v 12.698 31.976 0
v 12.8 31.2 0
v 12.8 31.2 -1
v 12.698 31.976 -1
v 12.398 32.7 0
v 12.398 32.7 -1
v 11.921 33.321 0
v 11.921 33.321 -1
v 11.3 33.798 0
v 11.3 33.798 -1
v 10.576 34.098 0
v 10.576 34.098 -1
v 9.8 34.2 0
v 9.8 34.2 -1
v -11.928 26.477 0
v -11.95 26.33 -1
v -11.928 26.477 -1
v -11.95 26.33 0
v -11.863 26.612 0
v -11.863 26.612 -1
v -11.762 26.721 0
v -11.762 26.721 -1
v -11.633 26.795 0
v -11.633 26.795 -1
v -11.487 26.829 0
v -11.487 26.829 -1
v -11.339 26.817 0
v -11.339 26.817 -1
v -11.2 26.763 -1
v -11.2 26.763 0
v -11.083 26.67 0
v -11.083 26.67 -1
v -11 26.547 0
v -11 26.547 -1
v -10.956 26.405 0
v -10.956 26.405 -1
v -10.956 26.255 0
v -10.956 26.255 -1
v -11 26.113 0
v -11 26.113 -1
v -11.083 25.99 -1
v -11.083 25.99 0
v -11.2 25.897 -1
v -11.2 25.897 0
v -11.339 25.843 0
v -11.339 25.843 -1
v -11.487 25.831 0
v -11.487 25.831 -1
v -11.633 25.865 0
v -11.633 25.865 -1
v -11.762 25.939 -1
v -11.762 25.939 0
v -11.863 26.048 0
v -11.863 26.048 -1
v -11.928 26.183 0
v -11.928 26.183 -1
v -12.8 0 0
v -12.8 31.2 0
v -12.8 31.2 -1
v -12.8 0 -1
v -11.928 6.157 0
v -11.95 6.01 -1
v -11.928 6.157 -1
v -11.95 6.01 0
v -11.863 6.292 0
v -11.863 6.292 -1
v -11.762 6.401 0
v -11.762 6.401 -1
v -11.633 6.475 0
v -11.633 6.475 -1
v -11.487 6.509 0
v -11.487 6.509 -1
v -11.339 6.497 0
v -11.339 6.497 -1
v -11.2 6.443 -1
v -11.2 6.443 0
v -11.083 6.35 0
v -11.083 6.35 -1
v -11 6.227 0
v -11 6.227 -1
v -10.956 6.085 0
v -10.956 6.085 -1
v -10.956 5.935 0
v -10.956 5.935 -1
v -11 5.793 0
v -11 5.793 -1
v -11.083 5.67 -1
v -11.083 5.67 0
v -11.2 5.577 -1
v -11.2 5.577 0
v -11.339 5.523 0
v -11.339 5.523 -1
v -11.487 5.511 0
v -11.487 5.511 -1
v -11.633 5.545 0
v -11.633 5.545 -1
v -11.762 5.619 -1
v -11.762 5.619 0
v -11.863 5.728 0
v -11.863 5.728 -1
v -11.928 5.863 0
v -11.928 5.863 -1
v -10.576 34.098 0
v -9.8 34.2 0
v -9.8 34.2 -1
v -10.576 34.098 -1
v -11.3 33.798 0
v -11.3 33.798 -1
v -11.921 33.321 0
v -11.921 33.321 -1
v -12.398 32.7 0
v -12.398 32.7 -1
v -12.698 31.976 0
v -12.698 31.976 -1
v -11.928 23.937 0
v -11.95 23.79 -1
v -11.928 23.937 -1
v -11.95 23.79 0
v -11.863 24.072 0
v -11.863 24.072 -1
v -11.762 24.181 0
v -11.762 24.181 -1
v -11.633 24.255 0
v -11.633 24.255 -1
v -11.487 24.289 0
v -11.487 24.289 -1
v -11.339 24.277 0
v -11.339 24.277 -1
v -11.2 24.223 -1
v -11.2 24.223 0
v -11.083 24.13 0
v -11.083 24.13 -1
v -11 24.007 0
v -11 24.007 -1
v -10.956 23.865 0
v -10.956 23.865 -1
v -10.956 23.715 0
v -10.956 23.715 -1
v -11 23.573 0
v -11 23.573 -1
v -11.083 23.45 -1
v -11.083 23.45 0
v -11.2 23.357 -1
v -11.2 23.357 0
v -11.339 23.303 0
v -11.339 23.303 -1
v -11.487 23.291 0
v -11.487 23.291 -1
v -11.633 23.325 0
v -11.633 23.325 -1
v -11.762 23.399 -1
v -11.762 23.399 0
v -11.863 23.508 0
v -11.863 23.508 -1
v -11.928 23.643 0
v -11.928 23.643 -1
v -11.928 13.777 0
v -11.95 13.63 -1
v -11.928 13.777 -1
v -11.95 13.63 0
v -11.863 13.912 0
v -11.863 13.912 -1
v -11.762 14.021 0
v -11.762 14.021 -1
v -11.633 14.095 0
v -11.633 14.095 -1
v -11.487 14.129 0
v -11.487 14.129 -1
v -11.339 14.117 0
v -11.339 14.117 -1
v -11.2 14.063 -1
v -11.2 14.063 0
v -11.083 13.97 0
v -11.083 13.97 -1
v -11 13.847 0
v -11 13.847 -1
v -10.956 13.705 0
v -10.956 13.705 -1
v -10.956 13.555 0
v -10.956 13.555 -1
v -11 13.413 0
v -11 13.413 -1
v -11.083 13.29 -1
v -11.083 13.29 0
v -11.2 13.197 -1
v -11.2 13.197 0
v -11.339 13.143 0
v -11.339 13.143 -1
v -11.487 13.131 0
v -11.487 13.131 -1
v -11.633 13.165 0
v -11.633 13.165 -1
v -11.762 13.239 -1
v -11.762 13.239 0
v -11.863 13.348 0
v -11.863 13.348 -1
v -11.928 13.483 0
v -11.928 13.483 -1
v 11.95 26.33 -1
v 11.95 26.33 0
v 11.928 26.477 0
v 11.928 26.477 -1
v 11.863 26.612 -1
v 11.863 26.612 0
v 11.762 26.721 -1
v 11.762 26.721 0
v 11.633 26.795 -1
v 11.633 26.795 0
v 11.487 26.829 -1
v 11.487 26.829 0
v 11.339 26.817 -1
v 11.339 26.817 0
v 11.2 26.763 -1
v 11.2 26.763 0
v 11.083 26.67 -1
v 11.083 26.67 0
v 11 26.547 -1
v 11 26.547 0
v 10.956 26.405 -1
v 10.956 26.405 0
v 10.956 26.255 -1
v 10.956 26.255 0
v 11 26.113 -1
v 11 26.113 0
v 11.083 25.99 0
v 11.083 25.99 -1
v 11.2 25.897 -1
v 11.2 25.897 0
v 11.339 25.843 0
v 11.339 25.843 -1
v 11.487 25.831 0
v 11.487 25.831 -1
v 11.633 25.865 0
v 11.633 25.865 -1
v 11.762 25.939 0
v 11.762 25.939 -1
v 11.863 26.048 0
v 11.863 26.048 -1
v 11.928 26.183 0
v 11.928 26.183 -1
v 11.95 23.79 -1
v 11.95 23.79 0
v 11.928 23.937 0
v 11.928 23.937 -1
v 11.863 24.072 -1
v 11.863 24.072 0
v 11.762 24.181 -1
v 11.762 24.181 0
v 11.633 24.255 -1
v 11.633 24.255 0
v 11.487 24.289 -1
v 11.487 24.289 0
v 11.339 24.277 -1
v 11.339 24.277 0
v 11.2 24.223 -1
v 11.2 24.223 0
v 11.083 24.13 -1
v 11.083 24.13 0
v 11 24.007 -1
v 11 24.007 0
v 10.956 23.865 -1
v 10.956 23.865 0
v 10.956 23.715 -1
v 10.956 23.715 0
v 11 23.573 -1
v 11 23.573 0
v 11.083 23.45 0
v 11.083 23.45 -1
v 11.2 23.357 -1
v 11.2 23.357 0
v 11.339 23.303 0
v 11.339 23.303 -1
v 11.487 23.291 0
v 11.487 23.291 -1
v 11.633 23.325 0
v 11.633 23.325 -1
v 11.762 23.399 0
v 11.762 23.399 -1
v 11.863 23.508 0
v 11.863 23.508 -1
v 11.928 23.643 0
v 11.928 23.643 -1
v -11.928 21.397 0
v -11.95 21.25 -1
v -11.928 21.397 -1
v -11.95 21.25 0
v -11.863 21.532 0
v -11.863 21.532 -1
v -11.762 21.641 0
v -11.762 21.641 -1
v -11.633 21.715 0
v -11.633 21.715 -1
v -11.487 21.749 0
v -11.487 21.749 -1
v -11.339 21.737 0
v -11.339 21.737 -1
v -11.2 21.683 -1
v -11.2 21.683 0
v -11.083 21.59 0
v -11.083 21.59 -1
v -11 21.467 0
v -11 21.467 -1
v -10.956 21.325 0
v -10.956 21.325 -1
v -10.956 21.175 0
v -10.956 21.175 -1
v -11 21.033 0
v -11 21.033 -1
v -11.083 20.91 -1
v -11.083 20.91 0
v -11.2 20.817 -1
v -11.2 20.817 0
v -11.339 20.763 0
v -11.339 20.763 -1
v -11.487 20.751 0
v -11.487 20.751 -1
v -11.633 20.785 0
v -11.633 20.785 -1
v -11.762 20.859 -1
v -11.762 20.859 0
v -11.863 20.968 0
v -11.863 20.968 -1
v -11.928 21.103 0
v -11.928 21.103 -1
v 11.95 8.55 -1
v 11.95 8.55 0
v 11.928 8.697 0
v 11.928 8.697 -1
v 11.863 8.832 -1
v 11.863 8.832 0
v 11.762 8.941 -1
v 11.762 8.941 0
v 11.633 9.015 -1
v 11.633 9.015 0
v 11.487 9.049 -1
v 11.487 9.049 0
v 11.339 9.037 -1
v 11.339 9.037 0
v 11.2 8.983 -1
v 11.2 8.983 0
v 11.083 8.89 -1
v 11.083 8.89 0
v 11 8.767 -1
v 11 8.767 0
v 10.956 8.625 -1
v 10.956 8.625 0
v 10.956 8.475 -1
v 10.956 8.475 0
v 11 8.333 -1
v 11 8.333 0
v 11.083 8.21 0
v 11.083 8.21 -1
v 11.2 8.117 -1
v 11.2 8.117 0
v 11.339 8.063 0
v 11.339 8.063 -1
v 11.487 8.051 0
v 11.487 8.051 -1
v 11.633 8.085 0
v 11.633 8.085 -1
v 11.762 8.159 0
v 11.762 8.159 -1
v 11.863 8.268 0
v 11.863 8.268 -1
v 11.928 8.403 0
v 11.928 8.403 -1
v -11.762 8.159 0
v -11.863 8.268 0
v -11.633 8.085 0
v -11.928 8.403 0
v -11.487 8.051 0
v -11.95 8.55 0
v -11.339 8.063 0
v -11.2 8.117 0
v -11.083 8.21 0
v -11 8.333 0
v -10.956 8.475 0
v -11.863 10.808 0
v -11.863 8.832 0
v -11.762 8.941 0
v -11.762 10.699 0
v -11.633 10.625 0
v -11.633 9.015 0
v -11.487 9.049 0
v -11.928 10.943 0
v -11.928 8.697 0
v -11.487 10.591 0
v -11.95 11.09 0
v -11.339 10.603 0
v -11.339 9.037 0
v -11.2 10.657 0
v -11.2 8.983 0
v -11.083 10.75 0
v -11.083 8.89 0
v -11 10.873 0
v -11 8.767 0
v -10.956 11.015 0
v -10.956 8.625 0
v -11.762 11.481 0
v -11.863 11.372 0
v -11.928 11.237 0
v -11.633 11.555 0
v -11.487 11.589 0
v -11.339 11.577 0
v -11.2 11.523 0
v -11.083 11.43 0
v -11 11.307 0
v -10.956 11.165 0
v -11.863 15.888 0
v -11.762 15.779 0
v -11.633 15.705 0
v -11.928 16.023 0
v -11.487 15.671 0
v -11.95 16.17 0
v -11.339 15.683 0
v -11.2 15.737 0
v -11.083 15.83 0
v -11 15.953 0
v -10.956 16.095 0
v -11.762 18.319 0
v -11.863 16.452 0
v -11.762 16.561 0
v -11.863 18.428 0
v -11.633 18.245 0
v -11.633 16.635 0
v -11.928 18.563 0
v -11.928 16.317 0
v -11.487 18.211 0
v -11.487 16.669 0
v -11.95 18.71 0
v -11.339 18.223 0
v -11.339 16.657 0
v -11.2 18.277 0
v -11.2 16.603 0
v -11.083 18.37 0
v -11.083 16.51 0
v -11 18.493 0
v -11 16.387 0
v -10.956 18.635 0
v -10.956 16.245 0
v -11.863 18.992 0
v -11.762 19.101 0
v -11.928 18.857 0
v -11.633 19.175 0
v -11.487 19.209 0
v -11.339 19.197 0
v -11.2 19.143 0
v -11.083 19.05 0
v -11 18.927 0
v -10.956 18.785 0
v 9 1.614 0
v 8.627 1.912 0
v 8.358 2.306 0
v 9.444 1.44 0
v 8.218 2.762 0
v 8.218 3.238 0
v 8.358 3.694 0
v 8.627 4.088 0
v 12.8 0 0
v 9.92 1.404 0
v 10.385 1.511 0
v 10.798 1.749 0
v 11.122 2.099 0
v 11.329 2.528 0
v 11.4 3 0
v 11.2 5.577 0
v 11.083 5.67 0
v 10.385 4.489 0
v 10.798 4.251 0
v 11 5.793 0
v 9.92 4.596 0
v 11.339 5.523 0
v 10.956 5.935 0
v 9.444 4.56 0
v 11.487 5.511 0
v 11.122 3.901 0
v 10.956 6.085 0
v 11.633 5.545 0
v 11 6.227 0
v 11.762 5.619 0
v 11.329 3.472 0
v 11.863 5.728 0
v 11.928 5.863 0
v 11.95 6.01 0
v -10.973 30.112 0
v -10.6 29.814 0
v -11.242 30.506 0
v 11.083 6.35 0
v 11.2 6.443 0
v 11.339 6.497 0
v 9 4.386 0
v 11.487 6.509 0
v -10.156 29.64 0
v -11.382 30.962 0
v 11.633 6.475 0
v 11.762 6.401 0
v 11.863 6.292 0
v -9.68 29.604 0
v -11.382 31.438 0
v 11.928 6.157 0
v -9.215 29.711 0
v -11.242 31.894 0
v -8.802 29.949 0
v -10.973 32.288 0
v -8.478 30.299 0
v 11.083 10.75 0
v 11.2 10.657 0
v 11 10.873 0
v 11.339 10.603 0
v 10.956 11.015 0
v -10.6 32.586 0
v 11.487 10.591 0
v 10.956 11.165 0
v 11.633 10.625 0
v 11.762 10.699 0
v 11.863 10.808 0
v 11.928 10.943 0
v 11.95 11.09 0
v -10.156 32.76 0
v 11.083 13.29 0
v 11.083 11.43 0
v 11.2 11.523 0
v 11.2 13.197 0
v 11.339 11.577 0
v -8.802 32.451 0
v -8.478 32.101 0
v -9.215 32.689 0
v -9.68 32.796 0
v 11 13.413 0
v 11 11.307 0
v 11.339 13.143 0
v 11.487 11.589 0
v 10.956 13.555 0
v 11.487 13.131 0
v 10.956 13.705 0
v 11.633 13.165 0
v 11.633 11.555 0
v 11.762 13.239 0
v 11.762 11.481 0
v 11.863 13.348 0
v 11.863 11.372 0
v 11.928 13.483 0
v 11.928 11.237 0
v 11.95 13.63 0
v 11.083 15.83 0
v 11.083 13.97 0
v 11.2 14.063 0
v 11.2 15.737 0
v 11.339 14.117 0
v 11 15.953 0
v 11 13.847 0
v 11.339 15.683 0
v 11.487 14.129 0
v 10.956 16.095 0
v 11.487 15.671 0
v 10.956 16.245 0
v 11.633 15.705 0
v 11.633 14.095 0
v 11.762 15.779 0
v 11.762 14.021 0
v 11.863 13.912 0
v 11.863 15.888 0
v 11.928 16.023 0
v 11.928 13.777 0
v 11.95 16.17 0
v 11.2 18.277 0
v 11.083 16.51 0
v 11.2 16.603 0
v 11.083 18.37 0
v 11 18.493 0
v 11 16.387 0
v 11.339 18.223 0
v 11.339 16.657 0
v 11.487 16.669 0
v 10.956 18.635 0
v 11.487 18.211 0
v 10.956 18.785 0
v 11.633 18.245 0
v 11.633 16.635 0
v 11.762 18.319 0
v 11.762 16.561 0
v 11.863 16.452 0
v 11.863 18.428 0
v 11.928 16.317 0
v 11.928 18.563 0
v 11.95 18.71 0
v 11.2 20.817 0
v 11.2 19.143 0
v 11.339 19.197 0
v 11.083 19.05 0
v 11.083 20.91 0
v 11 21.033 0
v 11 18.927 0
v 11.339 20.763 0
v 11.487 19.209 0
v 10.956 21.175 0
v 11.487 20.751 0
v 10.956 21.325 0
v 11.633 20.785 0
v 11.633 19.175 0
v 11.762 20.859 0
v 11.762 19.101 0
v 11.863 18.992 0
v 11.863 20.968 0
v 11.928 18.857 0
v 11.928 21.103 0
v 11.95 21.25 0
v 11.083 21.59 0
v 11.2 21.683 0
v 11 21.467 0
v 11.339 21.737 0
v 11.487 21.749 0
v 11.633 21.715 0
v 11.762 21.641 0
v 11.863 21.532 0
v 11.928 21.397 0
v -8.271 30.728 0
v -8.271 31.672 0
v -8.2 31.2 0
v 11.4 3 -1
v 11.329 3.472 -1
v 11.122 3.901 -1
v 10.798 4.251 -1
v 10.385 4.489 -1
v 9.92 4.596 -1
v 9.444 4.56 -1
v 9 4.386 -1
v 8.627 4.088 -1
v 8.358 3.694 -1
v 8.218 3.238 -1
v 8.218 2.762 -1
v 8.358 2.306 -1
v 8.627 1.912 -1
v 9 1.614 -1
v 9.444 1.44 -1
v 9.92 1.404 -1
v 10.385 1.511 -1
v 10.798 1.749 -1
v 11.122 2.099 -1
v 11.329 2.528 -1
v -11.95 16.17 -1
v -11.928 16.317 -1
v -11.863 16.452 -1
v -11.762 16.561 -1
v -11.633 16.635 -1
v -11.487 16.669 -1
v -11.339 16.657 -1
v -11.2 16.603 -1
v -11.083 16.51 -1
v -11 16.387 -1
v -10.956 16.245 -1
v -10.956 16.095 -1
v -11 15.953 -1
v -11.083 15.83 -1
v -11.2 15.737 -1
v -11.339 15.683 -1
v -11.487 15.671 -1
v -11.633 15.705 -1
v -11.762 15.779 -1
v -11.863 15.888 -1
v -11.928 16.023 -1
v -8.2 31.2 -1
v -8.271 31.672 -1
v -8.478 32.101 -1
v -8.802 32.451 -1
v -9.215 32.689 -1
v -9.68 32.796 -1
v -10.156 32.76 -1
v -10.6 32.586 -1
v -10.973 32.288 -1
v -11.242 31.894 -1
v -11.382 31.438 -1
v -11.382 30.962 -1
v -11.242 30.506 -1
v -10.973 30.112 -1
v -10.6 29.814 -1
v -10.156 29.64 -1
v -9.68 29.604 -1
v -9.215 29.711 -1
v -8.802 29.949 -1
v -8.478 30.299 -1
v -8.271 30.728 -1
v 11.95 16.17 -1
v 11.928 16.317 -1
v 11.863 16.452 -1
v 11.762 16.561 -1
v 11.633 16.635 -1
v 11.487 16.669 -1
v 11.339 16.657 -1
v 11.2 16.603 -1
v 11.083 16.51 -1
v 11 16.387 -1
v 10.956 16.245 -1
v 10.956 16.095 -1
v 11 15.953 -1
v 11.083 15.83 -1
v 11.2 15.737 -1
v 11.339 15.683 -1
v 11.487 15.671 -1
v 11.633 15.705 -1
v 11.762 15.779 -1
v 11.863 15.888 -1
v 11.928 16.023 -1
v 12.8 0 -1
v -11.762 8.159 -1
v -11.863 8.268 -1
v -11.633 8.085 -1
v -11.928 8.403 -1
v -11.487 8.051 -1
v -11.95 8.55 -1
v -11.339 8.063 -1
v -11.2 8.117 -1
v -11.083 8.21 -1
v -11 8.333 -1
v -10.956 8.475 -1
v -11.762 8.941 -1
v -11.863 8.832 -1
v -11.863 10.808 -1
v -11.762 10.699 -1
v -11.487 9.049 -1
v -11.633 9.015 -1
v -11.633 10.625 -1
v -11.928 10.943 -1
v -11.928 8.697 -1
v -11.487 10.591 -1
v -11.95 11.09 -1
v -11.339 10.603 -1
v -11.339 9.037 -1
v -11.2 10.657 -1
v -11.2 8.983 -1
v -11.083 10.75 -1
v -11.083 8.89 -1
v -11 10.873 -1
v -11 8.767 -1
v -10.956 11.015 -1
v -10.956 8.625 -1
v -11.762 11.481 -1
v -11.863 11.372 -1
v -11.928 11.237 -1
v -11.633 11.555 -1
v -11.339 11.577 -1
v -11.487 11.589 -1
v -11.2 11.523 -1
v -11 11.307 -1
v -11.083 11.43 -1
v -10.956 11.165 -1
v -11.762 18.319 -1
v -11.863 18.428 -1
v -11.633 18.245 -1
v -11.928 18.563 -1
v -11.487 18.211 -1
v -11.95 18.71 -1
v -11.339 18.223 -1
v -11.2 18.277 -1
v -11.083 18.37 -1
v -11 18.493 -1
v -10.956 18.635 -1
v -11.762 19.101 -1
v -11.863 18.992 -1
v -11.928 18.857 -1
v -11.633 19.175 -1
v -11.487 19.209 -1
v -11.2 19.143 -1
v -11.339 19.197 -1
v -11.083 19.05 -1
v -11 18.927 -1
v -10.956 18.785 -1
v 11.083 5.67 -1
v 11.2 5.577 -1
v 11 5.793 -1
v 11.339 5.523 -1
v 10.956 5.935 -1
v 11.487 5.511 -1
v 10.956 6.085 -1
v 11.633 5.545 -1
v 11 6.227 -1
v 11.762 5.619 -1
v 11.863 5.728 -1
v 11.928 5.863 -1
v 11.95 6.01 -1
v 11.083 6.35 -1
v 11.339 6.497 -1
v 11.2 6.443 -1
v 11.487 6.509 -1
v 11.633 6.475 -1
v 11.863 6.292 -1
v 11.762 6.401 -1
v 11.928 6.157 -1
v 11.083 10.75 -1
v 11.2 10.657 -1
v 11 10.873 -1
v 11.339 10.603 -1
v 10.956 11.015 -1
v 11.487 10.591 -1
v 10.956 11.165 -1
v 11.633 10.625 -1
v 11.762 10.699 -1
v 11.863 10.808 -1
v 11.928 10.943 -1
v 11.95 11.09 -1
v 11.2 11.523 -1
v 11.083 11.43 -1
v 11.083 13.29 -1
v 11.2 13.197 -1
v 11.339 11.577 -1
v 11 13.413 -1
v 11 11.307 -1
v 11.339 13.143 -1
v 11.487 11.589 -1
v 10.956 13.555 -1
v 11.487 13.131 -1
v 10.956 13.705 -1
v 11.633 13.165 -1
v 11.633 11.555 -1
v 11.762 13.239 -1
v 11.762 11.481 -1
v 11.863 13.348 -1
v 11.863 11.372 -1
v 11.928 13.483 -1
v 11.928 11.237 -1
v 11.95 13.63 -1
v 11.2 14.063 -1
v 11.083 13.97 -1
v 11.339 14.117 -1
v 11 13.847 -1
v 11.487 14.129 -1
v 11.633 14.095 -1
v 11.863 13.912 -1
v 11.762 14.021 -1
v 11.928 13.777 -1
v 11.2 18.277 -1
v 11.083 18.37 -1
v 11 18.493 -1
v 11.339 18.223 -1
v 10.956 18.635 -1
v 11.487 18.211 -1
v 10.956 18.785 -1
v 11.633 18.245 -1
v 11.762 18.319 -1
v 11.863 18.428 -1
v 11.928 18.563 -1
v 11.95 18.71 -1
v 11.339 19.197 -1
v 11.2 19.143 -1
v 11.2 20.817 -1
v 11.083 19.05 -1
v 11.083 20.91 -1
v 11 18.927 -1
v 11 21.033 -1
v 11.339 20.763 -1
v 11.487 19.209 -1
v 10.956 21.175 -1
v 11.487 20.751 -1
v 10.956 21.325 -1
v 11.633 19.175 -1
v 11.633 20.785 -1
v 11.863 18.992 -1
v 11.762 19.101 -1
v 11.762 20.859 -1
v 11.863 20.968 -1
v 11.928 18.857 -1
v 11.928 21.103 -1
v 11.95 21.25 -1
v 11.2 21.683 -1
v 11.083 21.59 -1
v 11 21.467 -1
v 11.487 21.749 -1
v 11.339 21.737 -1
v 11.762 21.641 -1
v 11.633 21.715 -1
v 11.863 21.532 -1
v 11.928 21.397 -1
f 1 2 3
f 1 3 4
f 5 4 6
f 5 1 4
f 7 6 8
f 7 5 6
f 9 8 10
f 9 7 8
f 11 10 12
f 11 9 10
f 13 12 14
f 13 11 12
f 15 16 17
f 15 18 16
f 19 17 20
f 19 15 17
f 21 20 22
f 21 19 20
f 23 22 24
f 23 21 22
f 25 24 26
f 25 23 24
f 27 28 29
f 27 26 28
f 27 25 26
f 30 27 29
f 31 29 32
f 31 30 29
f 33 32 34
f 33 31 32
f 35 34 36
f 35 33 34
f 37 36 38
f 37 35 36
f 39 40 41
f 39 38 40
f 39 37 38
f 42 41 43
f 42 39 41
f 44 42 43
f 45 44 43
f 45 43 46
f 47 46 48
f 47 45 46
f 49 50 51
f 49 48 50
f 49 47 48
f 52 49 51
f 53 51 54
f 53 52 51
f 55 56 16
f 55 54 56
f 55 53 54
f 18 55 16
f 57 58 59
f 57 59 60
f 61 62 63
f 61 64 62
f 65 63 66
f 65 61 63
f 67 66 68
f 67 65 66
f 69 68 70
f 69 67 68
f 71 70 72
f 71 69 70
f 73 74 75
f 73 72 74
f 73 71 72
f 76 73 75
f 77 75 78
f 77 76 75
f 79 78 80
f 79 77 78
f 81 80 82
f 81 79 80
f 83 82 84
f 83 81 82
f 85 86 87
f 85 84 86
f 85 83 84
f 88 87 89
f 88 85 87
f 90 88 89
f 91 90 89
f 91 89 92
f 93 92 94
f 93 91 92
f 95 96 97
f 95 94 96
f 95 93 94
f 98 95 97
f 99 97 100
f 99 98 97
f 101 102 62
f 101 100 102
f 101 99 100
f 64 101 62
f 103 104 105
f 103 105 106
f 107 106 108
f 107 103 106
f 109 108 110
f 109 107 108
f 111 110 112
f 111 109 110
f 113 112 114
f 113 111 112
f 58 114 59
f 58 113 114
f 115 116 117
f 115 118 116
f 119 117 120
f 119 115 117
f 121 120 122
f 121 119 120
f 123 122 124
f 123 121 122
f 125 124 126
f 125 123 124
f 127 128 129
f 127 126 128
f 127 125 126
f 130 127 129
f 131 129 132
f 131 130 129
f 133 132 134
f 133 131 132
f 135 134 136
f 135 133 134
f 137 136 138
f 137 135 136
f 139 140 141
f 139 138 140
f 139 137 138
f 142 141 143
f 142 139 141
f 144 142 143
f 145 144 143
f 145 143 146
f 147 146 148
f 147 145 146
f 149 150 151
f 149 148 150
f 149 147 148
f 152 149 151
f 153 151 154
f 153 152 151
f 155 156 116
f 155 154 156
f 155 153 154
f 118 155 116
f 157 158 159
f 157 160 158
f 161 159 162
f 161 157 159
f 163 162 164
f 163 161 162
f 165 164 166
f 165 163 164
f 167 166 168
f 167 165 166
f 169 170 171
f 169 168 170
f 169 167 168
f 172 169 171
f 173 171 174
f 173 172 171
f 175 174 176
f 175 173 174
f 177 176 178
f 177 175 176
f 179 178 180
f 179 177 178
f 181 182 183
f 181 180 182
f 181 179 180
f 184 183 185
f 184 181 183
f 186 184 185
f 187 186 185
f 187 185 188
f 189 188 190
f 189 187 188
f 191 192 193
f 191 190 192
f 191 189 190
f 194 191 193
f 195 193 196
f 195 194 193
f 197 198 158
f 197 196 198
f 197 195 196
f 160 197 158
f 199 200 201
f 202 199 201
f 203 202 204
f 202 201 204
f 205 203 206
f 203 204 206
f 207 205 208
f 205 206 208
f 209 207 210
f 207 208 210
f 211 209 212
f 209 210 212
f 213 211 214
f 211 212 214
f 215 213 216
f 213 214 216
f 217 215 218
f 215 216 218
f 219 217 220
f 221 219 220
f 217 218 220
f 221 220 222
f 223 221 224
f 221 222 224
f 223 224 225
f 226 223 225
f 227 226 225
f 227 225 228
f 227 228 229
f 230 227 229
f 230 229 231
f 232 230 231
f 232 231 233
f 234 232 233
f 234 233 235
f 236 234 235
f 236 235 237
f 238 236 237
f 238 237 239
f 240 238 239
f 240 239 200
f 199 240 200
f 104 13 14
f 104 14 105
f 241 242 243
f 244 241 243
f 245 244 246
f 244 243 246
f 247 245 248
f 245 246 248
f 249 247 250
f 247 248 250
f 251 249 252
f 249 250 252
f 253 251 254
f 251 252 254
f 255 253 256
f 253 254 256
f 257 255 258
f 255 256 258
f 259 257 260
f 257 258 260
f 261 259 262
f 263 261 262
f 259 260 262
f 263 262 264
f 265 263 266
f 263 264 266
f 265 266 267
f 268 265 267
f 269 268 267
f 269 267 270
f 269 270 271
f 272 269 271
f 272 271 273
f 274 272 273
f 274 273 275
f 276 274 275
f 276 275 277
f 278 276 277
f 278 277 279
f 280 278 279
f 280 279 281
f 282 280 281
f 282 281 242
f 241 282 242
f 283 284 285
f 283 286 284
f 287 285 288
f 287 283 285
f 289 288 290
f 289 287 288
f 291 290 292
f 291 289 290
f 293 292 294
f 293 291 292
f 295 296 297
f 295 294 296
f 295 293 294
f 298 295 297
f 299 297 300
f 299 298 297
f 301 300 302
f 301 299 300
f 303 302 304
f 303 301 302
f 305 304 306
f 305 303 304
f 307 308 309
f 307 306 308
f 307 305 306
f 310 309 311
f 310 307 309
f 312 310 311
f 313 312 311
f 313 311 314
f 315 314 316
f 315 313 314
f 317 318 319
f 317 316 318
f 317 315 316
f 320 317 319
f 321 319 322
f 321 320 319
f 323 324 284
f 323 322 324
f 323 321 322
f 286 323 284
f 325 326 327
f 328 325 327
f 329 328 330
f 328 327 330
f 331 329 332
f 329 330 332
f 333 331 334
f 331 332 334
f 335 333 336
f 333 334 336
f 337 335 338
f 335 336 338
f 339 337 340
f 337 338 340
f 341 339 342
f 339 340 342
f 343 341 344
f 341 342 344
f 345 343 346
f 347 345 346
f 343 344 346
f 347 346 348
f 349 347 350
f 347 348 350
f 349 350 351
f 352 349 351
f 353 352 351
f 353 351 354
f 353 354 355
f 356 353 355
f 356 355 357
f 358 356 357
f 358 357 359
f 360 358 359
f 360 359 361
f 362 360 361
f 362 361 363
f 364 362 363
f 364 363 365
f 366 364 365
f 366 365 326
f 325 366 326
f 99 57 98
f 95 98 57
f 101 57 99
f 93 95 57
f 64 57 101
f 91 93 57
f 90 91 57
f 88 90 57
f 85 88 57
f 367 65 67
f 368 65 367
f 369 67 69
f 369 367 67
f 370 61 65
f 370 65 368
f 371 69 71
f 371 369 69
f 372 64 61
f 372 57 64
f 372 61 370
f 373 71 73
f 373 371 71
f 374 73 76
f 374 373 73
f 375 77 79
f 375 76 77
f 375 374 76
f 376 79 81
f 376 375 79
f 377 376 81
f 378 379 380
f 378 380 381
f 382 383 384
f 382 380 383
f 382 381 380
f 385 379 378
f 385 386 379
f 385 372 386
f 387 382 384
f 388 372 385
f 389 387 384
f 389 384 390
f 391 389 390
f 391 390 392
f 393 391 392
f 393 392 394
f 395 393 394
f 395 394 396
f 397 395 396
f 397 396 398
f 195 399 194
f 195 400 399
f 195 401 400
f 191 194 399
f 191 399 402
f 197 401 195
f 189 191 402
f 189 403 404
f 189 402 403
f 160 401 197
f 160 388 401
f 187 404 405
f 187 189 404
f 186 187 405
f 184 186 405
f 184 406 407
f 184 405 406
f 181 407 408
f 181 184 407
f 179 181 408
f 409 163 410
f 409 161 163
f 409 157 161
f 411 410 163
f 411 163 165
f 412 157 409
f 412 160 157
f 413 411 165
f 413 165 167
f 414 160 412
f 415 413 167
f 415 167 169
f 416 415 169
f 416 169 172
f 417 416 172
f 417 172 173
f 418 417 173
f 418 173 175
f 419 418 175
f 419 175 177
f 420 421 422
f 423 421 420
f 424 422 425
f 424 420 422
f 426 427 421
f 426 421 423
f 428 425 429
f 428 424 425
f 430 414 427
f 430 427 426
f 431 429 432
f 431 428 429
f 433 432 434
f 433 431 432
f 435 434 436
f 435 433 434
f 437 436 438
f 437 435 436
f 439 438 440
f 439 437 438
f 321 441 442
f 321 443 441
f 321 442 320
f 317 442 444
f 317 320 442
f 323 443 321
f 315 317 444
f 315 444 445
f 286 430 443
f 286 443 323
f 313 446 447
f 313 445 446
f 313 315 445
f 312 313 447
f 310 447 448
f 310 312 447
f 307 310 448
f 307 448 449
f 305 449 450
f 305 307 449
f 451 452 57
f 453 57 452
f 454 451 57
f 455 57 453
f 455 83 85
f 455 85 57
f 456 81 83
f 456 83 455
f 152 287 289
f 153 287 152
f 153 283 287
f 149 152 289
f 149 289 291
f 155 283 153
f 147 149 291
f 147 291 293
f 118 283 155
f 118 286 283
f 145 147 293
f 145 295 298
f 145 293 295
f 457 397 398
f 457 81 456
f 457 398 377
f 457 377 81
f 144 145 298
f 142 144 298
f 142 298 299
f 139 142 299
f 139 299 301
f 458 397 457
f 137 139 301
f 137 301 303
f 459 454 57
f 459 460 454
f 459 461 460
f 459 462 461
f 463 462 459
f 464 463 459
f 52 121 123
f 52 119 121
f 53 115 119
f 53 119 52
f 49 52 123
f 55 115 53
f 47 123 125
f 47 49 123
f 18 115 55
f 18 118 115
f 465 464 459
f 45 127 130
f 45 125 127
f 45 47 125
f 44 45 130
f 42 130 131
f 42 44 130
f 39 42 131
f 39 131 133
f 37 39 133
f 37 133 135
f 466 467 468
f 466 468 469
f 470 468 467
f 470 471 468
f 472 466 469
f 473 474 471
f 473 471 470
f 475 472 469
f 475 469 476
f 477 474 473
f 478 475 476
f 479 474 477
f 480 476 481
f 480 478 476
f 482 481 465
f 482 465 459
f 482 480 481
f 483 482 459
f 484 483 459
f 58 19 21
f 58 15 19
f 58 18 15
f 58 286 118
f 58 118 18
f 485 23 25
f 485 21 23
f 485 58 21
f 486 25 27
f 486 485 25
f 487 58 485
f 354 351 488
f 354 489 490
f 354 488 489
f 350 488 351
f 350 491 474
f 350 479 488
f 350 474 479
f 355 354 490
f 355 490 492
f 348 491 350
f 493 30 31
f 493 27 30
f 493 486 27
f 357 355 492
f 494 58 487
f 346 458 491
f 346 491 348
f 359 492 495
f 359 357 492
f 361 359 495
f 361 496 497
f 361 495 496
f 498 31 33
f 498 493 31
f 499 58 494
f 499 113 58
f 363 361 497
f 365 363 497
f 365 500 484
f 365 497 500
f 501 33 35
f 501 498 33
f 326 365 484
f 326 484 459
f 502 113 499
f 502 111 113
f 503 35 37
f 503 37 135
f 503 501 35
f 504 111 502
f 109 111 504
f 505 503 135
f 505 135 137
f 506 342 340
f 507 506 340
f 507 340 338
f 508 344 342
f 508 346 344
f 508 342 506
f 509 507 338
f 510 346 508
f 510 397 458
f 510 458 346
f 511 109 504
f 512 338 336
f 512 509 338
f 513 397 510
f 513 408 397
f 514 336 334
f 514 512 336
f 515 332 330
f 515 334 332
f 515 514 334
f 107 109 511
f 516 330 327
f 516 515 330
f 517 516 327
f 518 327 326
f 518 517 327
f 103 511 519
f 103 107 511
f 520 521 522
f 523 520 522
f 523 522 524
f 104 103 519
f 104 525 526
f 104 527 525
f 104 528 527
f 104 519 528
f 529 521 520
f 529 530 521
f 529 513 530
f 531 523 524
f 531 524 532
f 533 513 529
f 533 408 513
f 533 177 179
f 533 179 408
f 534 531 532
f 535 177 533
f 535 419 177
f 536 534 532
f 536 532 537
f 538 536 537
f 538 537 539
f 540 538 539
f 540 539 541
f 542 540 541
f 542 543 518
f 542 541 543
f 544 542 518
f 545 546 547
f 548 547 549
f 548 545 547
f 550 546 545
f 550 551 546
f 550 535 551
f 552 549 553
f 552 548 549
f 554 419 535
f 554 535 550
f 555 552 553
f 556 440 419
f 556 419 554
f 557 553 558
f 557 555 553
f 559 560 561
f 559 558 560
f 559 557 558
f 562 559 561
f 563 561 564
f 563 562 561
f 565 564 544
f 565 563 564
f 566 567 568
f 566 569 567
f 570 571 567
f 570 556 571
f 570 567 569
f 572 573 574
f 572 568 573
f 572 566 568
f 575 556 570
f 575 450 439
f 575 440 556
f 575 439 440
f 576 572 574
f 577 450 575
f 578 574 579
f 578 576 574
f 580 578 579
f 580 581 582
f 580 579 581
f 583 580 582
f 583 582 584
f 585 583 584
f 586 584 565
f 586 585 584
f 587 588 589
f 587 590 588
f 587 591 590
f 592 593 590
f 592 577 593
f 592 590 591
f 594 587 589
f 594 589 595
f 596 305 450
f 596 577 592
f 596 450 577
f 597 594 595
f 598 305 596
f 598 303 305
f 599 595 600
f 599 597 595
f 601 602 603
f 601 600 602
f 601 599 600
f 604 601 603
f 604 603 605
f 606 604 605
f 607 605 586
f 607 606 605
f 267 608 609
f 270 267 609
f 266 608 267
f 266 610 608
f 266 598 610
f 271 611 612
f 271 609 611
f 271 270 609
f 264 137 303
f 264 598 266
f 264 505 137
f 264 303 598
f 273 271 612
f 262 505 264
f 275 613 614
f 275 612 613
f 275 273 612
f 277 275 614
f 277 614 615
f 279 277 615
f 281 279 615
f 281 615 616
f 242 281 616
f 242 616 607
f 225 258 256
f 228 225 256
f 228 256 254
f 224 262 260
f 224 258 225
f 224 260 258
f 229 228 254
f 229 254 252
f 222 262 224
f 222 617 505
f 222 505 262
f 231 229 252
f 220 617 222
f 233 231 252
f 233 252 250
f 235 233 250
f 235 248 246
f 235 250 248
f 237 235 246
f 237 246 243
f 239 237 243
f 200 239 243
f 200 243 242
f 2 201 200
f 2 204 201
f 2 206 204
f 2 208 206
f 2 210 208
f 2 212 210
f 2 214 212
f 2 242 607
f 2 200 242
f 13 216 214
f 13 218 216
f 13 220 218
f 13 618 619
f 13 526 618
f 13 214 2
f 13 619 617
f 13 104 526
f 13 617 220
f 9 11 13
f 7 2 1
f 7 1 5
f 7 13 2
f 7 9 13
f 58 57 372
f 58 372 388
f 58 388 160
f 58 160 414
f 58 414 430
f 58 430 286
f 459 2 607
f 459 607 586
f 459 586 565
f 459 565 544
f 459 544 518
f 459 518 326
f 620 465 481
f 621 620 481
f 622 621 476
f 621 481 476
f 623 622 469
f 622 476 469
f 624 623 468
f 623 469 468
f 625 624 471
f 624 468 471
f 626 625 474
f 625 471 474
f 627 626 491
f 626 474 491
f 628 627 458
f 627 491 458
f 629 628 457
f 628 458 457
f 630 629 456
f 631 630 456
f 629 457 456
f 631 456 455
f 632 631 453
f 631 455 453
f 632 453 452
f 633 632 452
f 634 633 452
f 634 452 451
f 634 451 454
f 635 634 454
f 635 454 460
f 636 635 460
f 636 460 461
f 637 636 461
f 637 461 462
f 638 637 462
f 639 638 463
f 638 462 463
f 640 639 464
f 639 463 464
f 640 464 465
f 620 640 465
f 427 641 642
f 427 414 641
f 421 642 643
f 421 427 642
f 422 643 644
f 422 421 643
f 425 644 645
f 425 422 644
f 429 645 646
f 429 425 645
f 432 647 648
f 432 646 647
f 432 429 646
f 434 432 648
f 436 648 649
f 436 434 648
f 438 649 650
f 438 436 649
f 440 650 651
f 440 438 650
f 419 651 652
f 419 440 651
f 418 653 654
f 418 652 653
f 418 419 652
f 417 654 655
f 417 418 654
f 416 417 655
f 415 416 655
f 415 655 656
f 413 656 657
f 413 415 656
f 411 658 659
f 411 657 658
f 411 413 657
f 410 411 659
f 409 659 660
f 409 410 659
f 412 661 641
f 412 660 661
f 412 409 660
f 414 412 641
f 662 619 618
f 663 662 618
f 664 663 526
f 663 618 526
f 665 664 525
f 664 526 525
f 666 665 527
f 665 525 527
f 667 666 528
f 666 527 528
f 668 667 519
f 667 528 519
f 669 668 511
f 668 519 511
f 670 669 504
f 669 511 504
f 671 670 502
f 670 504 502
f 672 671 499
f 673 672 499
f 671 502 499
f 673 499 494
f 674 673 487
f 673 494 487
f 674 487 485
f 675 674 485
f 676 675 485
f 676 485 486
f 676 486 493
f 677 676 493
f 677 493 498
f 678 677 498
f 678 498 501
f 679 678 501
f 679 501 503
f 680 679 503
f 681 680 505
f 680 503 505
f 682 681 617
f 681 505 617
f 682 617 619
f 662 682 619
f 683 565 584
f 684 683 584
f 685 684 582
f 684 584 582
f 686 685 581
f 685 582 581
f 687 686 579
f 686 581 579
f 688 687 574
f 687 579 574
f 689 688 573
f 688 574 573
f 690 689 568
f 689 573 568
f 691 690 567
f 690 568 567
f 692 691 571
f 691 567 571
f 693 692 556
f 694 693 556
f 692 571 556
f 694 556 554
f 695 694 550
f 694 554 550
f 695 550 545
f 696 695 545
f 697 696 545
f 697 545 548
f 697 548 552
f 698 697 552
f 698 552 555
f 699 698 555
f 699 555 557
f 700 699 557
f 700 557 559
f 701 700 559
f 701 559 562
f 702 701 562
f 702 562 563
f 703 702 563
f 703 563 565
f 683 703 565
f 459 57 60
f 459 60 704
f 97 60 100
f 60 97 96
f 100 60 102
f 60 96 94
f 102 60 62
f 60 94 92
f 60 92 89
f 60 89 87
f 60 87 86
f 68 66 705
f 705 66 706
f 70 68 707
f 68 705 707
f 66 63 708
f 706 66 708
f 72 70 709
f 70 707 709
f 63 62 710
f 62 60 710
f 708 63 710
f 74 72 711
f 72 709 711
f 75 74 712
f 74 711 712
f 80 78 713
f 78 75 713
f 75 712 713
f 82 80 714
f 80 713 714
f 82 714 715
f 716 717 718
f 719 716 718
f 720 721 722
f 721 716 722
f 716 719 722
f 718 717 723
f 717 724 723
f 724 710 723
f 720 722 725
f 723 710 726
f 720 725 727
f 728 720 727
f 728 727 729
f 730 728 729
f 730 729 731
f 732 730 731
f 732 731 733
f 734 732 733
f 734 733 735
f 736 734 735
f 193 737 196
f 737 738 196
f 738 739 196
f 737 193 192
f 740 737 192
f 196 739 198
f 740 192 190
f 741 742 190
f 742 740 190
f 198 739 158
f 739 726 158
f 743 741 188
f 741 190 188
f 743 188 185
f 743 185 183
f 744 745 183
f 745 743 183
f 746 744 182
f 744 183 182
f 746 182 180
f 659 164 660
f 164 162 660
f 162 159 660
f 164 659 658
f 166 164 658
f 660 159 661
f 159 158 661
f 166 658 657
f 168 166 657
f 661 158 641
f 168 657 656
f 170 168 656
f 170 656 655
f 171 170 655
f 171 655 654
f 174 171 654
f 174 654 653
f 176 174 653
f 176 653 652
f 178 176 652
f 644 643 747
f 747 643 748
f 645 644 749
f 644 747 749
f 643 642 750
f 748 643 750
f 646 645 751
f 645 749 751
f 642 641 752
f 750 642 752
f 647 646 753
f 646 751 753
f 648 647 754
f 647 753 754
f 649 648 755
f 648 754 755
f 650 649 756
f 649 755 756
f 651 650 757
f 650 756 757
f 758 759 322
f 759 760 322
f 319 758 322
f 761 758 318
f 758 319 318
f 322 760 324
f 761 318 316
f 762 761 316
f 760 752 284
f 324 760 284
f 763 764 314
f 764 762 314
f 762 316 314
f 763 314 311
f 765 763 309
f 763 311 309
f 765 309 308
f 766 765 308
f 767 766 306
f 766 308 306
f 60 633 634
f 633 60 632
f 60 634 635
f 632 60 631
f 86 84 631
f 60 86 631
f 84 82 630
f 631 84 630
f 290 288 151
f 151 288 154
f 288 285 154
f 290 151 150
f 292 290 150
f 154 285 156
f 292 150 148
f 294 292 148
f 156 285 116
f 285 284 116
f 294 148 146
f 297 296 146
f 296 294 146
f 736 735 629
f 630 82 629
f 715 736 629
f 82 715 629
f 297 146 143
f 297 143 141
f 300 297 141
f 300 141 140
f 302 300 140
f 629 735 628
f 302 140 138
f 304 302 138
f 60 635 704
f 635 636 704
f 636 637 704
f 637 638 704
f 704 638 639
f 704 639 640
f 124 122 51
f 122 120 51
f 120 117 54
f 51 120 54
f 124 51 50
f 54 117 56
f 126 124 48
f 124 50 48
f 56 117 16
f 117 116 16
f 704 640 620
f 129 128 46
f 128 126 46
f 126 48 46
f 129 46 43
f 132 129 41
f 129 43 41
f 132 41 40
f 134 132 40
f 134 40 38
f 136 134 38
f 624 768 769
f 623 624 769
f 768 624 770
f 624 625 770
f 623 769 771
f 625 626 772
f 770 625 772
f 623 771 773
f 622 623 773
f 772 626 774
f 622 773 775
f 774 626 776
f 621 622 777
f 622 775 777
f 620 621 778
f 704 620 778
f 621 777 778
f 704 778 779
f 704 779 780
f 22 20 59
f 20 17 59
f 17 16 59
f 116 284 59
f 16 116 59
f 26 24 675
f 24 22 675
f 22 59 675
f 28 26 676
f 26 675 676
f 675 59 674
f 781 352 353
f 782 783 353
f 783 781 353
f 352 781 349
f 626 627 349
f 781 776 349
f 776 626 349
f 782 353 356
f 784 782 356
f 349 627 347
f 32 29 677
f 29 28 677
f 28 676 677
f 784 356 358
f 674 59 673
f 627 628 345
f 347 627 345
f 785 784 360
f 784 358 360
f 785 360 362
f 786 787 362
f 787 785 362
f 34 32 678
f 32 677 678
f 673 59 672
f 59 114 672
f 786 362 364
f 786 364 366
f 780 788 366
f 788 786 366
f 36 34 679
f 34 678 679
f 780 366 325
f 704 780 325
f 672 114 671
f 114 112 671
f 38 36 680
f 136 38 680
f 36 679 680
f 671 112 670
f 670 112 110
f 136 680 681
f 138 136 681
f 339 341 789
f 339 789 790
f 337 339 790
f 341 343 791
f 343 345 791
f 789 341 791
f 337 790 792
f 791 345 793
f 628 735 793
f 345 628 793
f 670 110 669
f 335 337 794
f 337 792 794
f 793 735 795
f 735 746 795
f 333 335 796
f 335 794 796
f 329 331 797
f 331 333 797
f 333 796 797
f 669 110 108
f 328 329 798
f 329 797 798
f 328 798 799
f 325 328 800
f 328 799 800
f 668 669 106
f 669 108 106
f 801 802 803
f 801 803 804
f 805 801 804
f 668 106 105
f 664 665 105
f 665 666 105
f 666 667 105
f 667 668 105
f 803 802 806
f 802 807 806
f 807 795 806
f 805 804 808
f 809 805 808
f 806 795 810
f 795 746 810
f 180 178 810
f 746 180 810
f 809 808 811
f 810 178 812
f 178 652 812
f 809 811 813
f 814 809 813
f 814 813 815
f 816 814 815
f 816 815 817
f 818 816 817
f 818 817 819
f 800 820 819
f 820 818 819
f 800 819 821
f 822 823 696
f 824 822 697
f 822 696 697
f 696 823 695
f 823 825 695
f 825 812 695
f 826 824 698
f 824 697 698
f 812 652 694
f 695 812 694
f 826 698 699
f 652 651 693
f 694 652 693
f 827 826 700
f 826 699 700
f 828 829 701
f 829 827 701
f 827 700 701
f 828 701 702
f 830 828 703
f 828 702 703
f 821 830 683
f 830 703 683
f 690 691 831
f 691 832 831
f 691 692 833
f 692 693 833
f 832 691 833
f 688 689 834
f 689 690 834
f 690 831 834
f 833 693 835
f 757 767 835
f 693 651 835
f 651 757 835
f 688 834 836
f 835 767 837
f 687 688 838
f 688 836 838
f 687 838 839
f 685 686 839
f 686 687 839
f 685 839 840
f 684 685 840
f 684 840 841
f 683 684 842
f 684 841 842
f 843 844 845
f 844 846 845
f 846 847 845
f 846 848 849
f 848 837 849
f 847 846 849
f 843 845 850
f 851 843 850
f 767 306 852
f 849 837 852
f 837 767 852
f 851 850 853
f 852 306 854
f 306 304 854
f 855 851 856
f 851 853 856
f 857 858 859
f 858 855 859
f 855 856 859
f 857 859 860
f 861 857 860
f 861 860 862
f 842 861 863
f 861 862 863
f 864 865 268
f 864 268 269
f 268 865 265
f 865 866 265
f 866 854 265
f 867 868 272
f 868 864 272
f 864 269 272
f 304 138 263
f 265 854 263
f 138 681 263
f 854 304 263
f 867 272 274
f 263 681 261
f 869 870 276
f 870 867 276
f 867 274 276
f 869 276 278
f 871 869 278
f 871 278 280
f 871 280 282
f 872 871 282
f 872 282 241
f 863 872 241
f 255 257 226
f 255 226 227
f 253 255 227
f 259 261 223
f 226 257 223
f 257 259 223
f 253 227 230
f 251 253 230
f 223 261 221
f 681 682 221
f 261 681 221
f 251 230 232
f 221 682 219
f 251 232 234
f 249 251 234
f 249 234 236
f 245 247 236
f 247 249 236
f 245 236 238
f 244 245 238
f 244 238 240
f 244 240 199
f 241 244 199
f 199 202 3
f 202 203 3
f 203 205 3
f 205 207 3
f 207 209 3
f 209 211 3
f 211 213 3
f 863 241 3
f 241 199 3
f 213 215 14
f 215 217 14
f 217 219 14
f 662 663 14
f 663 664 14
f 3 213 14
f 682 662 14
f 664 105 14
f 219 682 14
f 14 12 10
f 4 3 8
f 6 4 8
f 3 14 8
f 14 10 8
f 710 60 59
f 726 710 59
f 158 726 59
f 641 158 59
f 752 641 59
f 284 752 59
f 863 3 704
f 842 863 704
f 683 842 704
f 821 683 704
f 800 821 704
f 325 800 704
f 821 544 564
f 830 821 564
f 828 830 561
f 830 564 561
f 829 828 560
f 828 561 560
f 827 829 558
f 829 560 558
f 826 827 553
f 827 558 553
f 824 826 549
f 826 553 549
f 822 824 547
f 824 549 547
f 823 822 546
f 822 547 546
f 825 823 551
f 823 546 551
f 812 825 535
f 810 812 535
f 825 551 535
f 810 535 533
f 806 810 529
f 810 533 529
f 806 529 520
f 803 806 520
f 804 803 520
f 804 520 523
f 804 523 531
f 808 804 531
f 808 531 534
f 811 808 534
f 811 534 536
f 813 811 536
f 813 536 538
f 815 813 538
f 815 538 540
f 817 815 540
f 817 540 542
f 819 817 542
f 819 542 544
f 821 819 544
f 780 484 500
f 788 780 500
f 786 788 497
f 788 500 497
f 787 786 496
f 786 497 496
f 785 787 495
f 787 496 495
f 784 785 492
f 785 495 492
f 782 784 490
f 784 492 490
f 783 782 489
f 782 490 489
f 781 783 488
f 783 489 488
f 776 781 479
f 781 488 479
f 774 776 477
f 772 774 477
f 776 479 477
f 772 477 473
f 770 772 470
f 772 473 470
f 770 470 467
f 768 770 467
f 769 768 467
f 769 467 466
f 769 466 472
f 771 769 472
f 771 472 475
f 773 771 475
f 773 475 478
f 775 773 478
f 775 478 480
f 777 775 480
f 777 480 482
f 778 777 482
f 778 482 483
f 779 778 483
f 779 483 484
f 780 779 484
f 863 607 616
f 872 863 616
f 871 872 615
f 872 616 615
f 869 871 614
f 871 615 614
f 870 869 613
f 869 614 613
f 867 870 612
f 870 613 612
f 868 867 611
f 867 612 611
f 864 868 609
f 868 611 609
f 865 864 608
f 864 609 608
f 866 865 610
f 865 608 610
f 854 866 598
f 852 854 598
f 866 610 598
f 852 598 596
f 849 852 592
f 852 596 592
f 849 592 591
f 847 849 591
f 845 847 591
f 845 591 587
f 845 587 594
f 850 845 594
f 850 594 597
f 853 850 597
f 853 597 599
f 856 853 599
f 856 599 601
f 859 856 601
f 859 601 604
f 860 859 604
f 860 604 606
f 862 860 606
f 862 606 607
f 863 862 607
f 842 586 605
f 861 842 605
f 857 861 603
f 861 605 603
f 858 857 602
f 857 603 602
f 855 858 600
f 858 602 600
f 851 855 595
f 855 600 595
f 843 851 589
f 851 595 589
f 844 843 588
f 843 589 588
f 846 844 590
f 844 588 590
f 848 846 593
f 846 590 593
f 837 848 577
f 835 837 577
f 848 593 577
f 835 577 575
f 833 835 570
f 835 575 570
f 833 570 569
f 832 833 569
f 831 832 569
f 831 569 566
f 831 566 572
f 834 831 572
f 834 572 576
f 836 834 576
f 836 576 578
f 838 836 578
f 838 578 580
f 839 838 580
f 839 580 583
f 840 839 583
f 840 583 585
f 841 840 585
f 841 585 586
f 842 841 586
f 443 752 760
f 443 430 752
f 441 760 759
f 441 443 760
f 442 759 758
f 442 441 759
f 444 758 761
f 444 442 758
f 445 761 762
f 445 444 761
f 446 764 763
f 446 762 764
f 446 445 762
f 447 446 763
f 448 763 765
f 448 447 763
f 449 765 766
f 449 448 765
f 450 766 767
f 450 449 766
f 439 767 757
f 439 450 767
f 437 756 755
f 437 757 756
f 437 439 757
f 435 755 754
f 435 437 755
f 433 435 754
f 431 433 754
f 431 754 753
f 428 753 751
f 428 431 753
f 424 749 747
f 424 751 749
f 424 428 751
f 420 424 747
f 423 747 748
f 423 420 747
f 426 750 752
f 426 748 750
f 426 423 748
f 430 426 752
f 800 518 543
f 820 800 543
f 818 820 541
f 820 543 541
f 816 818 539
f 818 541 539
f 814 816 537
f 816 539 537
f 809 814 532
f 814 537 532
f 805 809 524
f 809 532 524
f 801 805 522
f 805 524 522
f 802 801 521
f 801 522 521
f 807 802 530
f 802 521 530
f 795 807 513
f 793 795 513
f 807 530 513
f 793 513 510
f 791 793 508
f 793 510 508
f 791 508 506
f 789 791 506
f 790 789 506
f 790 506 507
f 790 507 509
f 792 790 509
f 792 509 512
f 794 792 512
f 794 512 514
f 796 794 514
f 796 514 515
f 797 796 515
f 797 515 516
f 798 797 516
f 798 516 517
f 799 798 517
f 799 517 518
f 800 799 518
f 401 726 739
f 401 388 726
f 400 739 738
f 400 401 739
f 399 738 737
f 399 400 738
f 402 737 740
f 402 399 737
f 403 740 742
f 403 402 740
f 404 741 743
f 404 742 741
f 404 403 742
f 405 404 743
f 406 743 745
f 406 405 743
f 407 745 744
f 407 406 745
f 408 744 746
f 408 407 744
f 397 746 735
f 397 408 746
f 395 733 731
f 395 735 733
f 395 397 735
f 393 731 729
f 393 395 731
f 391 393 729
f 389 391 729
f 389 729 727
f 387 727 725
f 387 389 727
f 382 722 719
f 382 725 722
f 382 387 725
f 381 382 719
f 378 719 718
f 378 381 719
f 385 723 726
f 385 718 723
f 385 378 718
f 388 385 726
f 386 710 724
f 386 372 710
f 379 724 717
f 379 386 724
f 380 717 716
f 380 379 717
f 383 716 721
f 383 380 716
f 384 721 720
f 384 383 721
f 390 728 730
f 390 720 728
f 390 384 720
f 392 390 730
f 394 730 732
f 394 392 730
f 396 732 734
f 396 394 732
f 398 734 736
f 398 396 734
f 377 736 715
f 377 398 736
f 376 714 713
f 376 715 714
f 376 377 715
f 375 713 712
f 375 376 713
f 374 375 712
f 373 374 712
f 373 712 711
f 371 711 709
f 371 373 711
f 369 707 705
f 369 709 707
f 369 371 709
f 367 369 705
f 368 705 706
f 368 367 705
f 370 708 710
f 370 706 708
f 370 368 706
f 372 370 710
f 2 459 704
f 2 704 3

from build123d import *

# Parameters (mm, degrees)
SKETCH012_R                             = 1.6
PAD006_DEPTH                            = 1
SKETCH019_R                             = 0.5
POCKET003_DEPTH                         = 86.464442
POCKET003_DEPTH_BACK                    = 85.464442
SKETCH019_LINEARPATTERN001_2_R          = 0.5
POCKET003_LINEARPATTERN001_2_DEPTH      = 86.464442
POCKET003_LINEARPATTERN001_2_DEPTH_BACK = 85.464442
SKETCH019_LINEARPATTERN001_3_R          = 0.5
POCKET003_LINEARPATTERN001_3_DEPTH      = 86.464442
POCKET003_LINEARPATTERN001_3_DEPTH_BACK = 85.464442
SKETCH019_LINEARPATTERN001_4_R          = 0.5
POCKET003_LINEARPATTERN001_4_DEPTH      = 86.464442
POCKET003_LINEARPATTERN001_4_DEPTH_BACK = 85.464442
SKETCH019_LINEARPATTERN001_5_R          = 0.5
POCKET003_LINEARPATTERN001_5_DEPTH      = 86.464442
POCKET003_LINEARPATTERN001_5_DEPTH_BACK = 85.464442
SKETCH019_LINEARPATTERN001_6_R          = 0.5
POCKET003_LINEARPATTERN001_6_DEPTH      = 86.464442
POCKET003_LINEARPATTERN001_6_DEPTH_BACK = 85.464442
SKETCH019_LINEARPATTERN001_7_R          = 0.5
POCKET003_LINEARPATTERN001_7_DEPTH      = 86.464442
POCKET003_LINEARPATTERN001_7_DEPTH_BACK = 85.464442
SKETCH019_LINEARPATTERN001_8_R          = 0.5
POCKET003_LINEARPATTERN001_8_DEPTH      = 86.464442
POCKET003_LINEARPATTERN001_8_DEPTH_BACK = 85.464442
SKETCH019_LINEARPATTERN001_9_R          = 0.5
POCKET003_LINEARPATTERN001_9_DEPTH      = 86.464442
POCKET003_LINEARPATTERN001_9_DEPTH_BACK = 85.464442


with BuildPart() as part:
    # Sketch012 → Pad006 (new body)
    with BuildSketch(Plane.XY):
        with BuildLine():
            Line((9.8, 17.1), (-9.8, 17.1))
            ThreePointArc((-9.8, 17.1), (-11.92132, 16.22132), (-12.8, 14.1))
            Line((-12.8, 14.1), (-12.8, -17.1))
            Line((-12.8, -17.1), (12.8, -17.1))
            Line((12.8, -17.1), (12.8, 14.1))
            ThreePointArc((12.8, 14.1), (11.92132, 16.22132), (9.8, 17.1))
        make_face()
        with Locations((-9.8, 14.1)):
            Circle(SKETCH012_R, mode=Mode.SUBTRACT)
        with Locations((9.8, -14.1)):
            Circle(SKETCH012_R, mode=Mode.SUBTRACT)
    extrude(amount=-PAD006_DEPTH)

    # Sketch019 → Pocket003 (cut, two sides)
    with BuildSketch(Plane.XY) as pocket003_sk:
        with Locations((11.45, -11.09)):
            Circle(SKETCH019_R)
    pocket003 = extrude(amount=-POCKET003_DEPTH, mode=Mode.SUBTRACT) + extrude(pocket003_sk.sketch, amount=POCKET003_DEPTH_BACK, mode=Mode.SUBTRACT)

    # Sketch019 LinearPattern001 2 → Pocket003 LinearPattern001 2 (cut, two sides)
    with BuildSketch(Plane(origin=(0, 2.54, 0), x_dir=(1, 0, 0), z_dir=(0, 0, 1))) as pocket003_linearpattern001_2_sk:
        with Locations((11.45, -11.09)):
            Circle(SKETCH019_LINEARPATTERN001_2_R)
    pocket003_linearpattern001_2 = extrude(amount=-POCKET003_LINEARPATTERN001_2_DEPTH, mode=Mode.SUBTRACT) + extrude(pocket003_linearpattern001_2_sk.sketch, amount=POCKET003_LINEARPATTERN001_2_DEPTH_BACK, mode=Mode.SUBTRACT)

    # Sketch019 LinearPattern001 3 → Pocket003 LinearPattern001 3 (cut, two sides)
    with BuildSketch(Plane(origin=(0, 5.08, 0), x_dir=(1, 0, 0), z_dir=(0, 0, 1))) as pocket003_linearpattern001_3_sk:
        with Locations((11.45, -11.09)):
            Circle(SKETCH019_LINEARPATTERN001_3_R)
    pocket003_linearpattern001_3 = extrude(amount=-POCKET003_LINEARPATTERN001_3_DEPTH, mode=Mode.SUBTRACT) + extrude(pocket003_linearpattern001_3_sk.sketch, amount=POCKET003_LINEARPATTERN001_3_DEPTH_BACK, mode=Mode.SUBTRACT)

    # Sketch019 LinearPattern001 4 → Pocket003 LinearPattern001 4 (cut, two sides)
    with BuildSketch(Plane(origin=(0, 7.62, 0), x_dir=(1, 0, 0), z_dir=(0, 0, 1))) as pocket003_linearpattern001_4_sk:
        with Locations((11.45, -11.09)):
            Circle(SKETCH019_LINEARPATTERN001_4_R)
    pocket003_linearpattern001_4 = extrude(amount=-POCKET003_LINEARPATTERN001_4_DEPTH, mode=Mode.SUBTRACT) + extrude(pocket003_linearpattern001_4_sk.sketch, amount=POCKET003_LINEARPATTERN001_4_DEPTH_BACK, mode=Mode.SUBTRACT)

    # Sketch019 LinearPattern001 5 → Pocket003 LinearPattern001 5 (cut, two sides)
    with BuildSketch(Plane(origin=(0, 10.16, 0), x_dir=(1, 0, 0), z_dir=(0, 0, 1))) as pocket003_linearpattern001_5_sk:
        with Locations((11.45, -11.09)):
            Circle(SKETCH019_LINEARPATTERN001_5_R)
    pocket003_linearpattern001_5 = extrude(amount=-POCKET003_LINEARPATTERN001_5_DEPTH, mode=Mode.SUBTRACT) + extrude(pocket003_linearpattern001_5_sk.sketch, amount=POCKET003_LINEARPATTERN001_5_DEPTH_BACK, mode=Mode.SUBTRACT)

    # Sketch019 LinearPattern001 6 → Pocket003 LinearPattern001 6 (cut, two sides)
    with BuildSketch(Plane(origin=(0, 12.7, 0), x_dir=(1, 0, 0), z_dir=(0, 0, 1))) as pocket003_linearpattern001_6_sk:
        with Locations((11.45, -11.09)):
            Circle(SKETCH019_LINEARPATTERN001_6_R)
    pocket003_linearpattern001_6 = extrude(amount=-POCKET003_LINEARPATTERN001_6_DEPTH, mode=Mode.SUBTRACT) + extrude(pocket003_linearpattern001_6_sk.sketch, amount=POCKET003_LINEARPATTERN001_6_DEPTH_BACK, mode=Mode.SUBTRACT)

    # Sketch019 LinearPattern001 7 → Pocket003 LinearPattern001 7 (cut, two sides)
    with BuildSketch(Plane(origin=(0, 15.24, 0), x_dir=(1, 0, 0), z_dir=(0, 0, 1))) as pocket003_linearpattern001_7_sk:
        with Locations((11.45, -11.09)):
            Circle(SKETCH019_LINEARPATTERN001_7_R)
    pocket003_linearpattern001_7 = extrude(amount=-POCKET003_LINEARPATTERN001_7_DEPTH, mode=Mode.SUBTRACT) + extrude(pocket003_linearpattern001_7_sk.sketch, amount=POCKET003_LINEARPATTERN001_7_DEPTH_BACK, mode=Mode.SUBTRACT)

    # Sketch019 LinearPattern001 8 → Pocket003 LinearPattern001 8 (cut, two sides)
    with BuildSketch(Plane(origin=(0, 17.78, 0), x_dir=(1, 0, 0), z_dir=(0, 0, 1))) as pocket003_linearpattern001_8_sk:
        with Locations((11.45, -11.09)):
            Circle(SKETCH019_LINEARPATTERN001_8_R)
    pocket003_linearpattern001_8 = extrude(amount=-POCKET003_LINEARPATTERN001_8_DEPTH, mode=Mode.SUBTRACT) + extrude(pocket003_linearpattern001_8_sk.sketch, amount=POCKET003_LINEARPATTERN001_8_DEPTH_BACK, mode=Mode.SUBTRACT)

    # Sketch019 LinearPattern001 9 → Pocket003 LinearPattern001 9 (cut, two sides)
    with BuildSketch(Plane(origin=(0, 20.32, 0), x_dir=(1, 0, 0), z_dir=(0, 0, 1))) as pocket003_linearpattern001_9_sk:
        with Locations((11.45, -11.09)):
            Circle(SKETCH019_LINEARPATTERN001_9_R)
    pocket003_linearpattern001_9 = extrude(amount=-POCKET003_LINEARPATTERN001_9_DEPTH, mode=Mode.SUBTRACT) + extrude(pocket003_linearpattern001_9_sk.sketch, amount=POCKET003_LINEARPATTERN001_9_DEPTH_BACK, mode=Mode.SUBTRACT)

    # Mirrored004: Pocket003, Pocket003 LinearPattern001 2, Pocket003 LinearPattern001 3, Pocket003 LinearPattern001 4, Pocket003 LinearPattern001 5, Pocket003 LinearPattern001 6, Pocket003 LinearPattern001 7, Pocket003 LinearPattern001 8, Pocket003 LinearPattern001 9 across YZ
    add(pocket003.mirror(Plane.YZ), mode=Mode.SUBTRACT)
    add(pocket003_linearpattern001_2.mirror(Plane.YZ), mode=Mode.SUBTRACT)
    add(pocket003_linearpattern001_3.mirror(Plane.YZ), mode=Mode.SUBTRACT)
    add(pocket003_linearpattern001_4.mirror(Plane.YZ), mode=Mode.SUBTRACT)
    add(pocket003_linearpattern001_5.mirror(Plane.YZ), mode=Mode.SUBTRACT)
    add(pocket003_linearpattern001_6.mirror(Plane.YZ), mode=Mode.SUBTRACT)
    add(pocket003_linearpattern001_7.mirror(Plane.YZ), mode=Mode.SUBTRACT)
    add(pocket003_linearpattern001_8.mirror(Plane.YZ), mode=Mode.SUBTRACT)
    add(pocket003_linearpattern001_9.mirror(Plane.YZ), mode=Mode.SUBTRACT)


with BuildPart() as part_1:
    # Body005 placement: moved
    add(part.part.moved(Location((0, 17.1, 0))))


solid = part_1.part
